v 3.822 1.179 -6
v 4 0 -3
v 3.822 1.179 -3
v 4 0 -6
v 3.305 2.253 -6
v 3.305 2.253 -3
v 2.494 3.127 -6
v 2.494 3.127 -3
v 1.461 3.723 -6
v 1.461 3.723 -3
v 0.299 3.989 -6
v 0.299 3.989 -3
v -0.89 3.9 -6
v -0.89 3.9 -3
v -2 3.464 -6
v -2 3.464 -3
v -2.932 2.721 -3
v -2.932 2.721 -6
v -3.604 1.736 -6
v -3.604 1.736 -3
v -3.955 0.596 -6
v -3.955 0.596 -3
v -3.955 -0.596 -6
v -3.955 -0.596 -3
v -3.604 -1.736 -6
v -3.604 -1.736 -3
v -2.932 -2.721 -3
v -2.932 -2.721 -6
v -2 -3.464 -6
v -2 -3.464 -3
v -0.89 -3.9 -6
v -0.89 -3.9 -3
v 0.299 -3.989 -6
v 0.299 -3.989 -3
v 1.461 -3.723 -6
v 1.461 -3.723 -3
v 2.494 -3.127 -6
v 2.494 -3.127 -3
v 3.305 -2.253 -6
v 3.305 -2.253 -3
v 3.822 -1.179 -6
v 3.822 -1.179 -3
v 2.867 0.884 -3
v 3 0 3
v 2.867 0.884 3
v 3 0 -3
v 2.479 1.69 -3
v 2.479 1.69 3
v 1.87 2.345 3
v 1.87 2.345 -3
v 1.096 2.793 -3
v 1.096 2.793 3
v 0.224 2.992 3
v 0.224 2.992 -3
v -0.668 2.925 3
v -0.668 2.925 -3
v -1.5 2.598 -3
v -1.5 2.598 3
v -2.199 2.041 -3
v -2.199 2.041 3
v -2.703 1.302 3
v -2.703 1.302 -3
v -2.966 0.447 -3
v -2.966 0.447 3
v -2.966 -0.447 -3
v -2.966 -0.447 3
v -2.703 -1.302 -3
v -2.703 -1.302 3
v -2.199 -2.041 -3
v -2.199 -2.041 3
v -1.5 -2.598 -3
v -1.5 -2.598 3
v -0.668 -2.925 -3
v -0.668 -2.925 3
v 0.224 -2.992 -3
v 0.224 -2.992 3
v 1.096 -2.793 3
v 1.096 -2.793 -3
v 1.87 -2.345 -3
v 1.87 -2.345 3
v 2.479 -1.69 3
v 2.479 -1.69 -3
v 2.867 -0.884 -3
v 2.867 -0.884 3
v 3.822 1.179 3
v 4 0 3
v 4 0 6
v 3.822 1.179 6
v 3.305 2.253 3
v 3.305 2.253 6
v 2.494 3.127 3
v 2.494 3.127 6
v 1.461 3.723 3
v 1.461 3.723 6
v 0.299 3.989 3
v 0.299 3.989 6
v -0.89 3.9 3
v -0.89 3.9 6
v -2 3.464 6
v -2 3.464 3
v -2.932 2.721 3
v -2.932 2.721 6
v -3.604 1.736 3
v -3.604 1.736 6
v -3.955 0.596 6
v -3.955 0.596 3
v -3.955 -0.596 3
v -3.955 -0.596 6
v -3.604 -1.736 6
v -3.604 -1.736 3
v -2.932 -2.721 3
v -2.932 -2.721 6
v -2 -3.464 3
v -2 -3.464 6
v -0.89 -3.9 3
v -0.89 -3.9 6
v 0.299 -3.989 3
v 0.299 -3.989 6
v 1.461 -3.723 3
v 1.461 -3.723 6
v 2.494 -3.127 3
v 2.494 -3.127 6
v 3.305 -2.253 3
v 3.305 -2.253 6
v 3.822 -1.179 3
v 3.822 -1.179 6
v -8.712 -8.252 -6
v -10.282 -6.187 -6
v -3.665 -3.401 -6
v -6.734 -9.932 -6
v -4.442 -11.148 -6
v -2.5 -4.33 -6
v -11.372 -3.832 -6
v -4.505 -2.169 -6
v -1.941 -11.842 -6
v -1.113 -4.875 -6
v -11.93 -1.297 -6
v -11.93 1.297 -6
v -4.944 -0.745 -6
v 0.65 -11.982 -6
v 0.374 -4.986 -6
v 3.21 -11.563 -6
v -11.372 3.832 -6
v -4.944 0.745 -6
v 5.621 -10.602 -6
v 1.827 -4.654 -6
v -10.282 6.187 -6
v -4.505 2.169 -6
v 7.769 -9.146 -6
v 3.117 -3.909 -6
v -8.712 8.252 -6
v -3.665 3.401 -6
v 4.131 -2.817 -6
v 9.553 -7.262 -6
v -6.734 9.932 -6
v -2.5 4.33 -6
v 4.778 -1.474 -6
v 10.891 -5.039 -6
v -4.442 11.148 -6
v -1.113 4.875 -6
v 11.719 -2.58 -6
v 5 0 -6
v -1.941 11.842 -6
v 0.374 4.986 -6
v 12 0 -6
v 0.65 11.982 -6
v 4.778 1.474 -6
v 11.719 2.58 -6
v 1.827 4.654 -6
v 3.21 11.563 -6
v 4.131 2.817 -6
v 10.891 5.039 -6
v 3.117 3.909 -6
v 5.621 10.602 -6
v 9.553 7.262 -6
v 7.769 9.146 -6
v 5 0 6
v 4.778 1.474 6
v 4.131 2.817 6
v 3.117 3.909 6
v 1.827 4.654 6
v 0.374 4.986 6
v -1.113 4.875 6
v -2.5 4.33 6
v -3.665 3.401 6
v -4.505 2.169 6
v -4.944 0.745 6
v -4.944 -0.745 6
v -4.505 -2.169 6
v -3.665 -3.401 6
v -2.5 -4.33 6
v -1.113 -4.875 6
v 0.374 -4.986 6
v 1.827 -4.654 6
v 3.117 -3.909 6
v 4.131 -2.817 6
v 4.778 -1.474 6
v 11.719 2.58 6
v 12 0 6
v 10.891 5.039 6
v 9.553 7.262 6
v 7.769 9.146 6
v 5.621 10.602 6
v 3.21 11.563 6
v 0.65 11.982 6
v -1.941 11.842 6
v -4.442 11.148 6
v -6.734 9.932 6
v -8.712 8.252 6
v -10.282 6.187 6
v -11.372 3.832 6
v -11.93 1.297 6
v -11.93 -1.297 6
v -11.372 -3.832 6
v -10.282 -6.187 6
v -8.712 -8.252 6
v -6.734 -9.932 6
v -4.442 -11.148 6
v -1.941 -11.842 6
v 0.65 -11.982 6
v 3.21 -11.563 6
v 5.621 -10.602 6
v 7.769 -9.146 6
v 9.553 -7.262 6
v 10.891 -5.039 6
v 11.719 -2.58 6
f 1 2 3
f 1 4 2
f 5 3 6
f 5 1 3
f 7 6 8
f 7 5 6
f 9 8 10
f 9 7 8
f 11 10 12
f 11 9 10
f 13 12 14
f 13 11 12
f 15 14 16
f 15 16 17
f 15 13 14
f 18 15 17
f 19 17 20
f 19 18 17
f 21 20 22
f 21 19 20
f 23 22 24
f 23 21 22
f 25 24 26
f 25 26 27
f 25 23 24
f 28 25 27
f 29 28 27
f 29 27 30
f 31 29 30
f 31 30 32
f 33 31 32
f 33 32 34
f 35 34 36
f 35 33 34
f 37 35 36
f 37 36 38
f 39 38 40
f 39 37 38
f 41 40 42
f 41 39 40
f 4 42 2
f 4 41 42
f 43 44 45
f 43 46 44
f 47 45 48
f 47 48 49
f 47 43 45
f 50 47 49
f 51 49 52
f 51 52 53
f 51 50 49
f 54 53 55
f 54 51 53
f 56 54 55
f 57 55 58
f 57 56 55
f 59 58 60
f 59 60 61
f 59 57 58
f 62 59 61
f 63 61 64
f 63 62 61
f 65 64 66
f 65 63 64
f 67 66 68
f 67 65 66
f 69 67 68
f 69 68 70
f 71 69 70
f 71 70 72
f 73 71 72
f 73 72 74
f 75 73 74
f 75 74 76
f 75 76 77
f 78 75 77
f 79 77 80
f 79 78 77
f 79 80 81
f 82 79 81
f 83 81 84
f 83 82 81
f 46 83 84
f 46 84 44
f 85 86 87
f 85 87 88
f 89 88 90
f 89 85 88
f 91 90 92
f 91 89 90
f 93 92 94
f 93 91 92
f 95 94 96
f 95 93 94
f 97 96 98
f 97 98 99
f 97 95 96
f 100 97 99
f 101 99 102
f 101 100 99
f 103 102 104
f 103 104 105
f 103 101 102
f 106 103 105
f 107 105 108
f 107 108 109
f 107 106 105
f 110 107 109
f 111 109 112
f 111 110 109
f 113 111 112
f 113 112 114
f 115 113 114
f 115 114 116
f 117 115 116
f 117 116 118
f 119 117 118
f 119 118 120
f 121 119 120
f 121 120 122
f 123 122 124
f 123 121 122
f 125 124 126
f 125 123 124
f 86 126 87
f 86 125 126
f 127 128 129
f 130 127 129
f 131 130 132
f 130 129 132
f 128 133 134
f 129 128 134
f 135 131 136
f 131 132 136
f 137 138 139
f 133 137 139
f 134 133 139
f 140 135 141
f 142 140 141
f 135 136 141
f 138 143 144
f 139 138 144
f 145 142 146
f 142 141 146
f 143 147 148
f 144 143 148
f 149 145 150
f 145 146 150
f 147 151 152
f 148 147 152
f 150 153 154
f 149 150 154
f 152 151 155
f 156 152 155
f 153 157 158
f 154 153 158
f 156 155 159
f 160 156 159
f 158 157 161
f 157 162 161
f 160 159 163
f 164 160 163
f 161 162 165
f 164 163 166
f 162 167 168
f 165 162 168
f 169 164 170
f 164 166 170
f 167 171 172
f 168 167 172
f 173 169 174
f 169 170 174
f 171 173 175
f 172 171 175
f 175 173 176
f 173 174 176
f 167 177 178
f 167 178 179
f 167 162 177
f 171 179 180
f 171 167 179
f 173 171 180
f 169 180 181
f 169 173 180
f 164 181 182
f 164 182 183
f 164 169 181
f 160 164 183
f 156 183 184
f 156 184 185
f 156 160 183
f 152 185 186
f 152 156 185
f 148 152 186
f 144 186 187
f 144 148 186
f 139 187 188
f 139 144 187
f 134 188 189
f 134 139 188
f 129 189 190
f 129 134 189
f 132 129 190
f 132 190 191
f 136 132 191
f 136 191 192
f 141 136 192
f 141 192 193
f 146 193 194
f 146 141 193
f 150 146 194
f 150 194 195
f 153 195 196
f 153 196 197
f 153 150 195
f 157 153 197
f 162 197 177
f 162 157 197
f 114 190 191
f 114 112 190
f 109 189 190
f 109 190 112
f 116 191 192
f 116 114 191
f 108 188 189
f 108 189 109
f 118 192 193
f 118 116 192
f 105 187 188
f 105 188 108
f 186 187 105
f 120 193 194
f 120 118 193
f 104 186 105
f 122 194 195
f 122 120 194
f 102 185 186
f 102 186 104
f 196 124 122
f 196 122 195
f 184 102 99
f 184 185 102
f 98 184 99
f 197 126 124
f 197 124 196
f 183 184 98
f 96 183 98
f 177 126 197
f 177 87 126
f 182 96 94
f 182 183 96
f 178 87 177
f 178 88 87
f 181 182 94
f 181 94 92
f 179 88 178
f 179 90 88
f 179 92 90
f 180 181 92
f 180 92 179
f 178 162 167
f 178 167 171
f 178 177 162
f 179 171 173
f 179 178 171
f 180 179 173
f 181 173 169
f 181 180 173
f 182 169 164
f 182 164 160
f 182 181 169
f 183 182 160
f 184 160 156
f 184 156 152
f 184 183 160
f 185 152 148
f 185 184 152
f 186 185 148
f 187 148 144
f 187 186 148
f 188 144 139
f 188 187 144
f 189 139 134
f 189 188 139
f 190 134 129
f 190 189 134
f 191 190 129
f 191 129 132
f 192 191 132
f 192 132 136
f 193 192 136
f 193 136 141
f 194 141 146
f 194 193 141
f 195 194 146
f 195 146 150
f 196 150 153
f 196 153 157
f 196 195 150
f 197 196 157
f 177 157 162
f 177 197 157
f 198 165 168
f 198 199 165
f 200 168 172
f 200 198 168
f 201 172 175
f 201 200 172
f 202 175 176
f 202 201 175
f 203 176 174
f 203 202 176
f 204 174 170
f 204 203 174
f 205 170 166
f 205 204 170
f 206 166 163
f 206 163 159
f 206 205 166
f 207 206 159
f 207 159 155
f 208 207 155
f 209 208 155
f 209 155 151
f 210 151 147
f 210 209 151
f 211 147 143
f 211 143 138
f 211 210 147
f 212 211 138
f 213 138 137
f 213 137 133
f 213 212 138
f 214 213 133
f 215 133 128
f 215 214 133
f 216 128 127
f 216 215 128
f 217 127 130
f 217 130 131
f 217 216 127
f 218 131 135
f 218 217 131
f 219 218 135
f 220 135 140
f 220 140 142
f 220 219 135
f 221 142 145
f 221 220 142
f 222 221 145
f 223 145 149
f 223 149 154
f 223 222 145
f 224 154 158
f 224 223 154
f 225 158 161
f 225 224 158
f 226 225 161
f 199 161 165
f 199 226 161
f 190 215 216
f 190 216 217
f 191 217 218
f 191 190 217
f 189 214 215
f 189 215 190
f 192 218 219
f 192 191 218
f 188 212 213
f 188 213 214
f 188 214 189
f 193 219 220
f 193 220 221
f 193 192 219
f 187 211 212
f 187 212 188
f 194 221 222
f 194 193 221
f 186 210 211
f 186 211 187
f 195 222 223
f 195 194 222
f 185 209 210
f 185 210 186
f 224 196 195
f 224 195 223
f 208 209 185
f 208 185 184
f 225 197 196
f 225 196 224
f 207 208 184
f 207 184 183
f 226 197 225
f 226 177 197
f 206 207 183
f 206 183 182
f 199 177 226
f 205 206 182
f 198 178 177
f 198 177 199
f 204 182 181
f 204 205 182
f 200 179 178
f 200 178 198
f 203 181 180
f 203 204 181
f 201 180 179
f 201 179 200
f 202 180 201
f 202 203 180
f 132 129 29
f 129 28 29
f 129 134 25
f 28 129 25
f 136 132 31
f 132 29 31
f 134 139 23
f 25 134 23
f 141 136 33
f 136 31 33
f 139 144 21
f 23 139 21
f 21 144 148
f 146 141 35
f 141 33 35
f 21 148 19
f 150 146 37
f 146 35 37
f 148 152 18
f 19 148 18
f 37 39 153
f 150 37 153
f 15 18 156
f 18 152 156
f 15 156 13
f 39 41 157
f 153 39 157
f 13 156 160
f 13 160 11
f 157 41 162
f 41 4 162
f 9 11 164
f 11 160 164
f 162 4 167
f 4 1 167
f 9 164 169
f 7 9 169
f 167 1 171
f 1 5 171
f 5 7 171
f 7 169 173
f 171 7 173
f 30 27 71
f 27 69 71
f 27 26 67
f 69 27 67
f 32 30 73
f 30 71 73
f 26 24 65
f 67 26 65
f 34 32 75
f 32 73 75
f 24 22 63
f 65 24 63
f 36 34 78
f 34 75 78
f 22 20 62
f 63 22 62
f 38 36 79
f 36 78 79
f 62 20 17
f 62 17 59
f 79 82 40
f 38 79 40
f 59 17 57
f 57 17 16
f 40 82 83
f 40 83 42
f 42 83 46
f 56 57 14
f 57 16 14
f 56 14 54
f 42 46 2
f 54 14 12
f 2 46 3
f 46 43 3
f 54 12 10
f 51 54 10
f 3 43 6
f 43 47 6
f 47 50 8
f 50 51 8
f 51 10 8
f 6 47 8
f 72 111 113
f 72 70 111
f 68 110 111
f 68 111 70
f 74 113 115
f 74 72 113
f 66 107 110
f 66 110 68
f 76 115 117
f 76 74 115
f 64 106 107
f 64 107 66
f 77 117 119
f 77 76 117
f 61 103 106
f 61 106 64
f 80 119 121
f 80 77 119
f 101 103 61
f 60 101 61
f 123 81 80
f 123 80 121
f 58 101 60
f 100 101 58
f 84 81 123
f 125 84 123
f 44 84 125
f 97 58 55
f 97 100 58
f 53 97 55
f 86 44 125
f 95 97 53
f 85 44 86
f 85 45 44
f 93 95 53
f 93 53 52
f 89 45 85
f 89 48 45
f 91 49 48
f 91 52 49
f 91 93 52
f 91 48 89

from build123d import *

# Parameters (mm, degrees)
SKETCH_1_R      = 12
SKETCH_1_R_2    = 5
EXTRUDE_1_DEPTH = 6
SKETCH_1_3_R    = 5
SKETCH_1_3_R_2  = 4
EXTRUDE_2_DEPTH = 6
SKETCH_1_4_R    = 4
SKETCH_1_4_R_2  = 3
EXTRUDE_3_DEPTH = 3


with BuildPart() as part:
    # 草图1 → 凸台-拉伸1 (new, symmetric)
    with BuildSketch(Plane.XY):
        Circle(SKETCH_1_R)
        Circle(SKETCH_1_R_2, mode=Mode.SUBTRACT)
    extrude(amount=EXTRUDE_1_DEPTH, both=True)


with BuildPart() as body_2:
    # 草图1<3> → 凸台-拉伸2 (new, symmetric)
    with BuildSketch(Plane.XY):
        Circle(SKETCH_1_3_R)
        Circle(SKETCH_1_3_R_2, mode=Mode.SUBTRACT)
    extrude(amount=EXTRUDE_2_DEPTH, both=True)

    # 草图1<4> → 凸台-拉伸3 (add, symmetric)
    with BuildSketch(Plane.XY):
        Circle(SKETCH_1_4_R)
        Circle(SKETCH_1_4_R_2, mode=Mode.SUBTRACT)
    extrude(amount=EXTRUDE_3_DEPTH, both=True)


solid = Compound([part.part, body_2.part])
